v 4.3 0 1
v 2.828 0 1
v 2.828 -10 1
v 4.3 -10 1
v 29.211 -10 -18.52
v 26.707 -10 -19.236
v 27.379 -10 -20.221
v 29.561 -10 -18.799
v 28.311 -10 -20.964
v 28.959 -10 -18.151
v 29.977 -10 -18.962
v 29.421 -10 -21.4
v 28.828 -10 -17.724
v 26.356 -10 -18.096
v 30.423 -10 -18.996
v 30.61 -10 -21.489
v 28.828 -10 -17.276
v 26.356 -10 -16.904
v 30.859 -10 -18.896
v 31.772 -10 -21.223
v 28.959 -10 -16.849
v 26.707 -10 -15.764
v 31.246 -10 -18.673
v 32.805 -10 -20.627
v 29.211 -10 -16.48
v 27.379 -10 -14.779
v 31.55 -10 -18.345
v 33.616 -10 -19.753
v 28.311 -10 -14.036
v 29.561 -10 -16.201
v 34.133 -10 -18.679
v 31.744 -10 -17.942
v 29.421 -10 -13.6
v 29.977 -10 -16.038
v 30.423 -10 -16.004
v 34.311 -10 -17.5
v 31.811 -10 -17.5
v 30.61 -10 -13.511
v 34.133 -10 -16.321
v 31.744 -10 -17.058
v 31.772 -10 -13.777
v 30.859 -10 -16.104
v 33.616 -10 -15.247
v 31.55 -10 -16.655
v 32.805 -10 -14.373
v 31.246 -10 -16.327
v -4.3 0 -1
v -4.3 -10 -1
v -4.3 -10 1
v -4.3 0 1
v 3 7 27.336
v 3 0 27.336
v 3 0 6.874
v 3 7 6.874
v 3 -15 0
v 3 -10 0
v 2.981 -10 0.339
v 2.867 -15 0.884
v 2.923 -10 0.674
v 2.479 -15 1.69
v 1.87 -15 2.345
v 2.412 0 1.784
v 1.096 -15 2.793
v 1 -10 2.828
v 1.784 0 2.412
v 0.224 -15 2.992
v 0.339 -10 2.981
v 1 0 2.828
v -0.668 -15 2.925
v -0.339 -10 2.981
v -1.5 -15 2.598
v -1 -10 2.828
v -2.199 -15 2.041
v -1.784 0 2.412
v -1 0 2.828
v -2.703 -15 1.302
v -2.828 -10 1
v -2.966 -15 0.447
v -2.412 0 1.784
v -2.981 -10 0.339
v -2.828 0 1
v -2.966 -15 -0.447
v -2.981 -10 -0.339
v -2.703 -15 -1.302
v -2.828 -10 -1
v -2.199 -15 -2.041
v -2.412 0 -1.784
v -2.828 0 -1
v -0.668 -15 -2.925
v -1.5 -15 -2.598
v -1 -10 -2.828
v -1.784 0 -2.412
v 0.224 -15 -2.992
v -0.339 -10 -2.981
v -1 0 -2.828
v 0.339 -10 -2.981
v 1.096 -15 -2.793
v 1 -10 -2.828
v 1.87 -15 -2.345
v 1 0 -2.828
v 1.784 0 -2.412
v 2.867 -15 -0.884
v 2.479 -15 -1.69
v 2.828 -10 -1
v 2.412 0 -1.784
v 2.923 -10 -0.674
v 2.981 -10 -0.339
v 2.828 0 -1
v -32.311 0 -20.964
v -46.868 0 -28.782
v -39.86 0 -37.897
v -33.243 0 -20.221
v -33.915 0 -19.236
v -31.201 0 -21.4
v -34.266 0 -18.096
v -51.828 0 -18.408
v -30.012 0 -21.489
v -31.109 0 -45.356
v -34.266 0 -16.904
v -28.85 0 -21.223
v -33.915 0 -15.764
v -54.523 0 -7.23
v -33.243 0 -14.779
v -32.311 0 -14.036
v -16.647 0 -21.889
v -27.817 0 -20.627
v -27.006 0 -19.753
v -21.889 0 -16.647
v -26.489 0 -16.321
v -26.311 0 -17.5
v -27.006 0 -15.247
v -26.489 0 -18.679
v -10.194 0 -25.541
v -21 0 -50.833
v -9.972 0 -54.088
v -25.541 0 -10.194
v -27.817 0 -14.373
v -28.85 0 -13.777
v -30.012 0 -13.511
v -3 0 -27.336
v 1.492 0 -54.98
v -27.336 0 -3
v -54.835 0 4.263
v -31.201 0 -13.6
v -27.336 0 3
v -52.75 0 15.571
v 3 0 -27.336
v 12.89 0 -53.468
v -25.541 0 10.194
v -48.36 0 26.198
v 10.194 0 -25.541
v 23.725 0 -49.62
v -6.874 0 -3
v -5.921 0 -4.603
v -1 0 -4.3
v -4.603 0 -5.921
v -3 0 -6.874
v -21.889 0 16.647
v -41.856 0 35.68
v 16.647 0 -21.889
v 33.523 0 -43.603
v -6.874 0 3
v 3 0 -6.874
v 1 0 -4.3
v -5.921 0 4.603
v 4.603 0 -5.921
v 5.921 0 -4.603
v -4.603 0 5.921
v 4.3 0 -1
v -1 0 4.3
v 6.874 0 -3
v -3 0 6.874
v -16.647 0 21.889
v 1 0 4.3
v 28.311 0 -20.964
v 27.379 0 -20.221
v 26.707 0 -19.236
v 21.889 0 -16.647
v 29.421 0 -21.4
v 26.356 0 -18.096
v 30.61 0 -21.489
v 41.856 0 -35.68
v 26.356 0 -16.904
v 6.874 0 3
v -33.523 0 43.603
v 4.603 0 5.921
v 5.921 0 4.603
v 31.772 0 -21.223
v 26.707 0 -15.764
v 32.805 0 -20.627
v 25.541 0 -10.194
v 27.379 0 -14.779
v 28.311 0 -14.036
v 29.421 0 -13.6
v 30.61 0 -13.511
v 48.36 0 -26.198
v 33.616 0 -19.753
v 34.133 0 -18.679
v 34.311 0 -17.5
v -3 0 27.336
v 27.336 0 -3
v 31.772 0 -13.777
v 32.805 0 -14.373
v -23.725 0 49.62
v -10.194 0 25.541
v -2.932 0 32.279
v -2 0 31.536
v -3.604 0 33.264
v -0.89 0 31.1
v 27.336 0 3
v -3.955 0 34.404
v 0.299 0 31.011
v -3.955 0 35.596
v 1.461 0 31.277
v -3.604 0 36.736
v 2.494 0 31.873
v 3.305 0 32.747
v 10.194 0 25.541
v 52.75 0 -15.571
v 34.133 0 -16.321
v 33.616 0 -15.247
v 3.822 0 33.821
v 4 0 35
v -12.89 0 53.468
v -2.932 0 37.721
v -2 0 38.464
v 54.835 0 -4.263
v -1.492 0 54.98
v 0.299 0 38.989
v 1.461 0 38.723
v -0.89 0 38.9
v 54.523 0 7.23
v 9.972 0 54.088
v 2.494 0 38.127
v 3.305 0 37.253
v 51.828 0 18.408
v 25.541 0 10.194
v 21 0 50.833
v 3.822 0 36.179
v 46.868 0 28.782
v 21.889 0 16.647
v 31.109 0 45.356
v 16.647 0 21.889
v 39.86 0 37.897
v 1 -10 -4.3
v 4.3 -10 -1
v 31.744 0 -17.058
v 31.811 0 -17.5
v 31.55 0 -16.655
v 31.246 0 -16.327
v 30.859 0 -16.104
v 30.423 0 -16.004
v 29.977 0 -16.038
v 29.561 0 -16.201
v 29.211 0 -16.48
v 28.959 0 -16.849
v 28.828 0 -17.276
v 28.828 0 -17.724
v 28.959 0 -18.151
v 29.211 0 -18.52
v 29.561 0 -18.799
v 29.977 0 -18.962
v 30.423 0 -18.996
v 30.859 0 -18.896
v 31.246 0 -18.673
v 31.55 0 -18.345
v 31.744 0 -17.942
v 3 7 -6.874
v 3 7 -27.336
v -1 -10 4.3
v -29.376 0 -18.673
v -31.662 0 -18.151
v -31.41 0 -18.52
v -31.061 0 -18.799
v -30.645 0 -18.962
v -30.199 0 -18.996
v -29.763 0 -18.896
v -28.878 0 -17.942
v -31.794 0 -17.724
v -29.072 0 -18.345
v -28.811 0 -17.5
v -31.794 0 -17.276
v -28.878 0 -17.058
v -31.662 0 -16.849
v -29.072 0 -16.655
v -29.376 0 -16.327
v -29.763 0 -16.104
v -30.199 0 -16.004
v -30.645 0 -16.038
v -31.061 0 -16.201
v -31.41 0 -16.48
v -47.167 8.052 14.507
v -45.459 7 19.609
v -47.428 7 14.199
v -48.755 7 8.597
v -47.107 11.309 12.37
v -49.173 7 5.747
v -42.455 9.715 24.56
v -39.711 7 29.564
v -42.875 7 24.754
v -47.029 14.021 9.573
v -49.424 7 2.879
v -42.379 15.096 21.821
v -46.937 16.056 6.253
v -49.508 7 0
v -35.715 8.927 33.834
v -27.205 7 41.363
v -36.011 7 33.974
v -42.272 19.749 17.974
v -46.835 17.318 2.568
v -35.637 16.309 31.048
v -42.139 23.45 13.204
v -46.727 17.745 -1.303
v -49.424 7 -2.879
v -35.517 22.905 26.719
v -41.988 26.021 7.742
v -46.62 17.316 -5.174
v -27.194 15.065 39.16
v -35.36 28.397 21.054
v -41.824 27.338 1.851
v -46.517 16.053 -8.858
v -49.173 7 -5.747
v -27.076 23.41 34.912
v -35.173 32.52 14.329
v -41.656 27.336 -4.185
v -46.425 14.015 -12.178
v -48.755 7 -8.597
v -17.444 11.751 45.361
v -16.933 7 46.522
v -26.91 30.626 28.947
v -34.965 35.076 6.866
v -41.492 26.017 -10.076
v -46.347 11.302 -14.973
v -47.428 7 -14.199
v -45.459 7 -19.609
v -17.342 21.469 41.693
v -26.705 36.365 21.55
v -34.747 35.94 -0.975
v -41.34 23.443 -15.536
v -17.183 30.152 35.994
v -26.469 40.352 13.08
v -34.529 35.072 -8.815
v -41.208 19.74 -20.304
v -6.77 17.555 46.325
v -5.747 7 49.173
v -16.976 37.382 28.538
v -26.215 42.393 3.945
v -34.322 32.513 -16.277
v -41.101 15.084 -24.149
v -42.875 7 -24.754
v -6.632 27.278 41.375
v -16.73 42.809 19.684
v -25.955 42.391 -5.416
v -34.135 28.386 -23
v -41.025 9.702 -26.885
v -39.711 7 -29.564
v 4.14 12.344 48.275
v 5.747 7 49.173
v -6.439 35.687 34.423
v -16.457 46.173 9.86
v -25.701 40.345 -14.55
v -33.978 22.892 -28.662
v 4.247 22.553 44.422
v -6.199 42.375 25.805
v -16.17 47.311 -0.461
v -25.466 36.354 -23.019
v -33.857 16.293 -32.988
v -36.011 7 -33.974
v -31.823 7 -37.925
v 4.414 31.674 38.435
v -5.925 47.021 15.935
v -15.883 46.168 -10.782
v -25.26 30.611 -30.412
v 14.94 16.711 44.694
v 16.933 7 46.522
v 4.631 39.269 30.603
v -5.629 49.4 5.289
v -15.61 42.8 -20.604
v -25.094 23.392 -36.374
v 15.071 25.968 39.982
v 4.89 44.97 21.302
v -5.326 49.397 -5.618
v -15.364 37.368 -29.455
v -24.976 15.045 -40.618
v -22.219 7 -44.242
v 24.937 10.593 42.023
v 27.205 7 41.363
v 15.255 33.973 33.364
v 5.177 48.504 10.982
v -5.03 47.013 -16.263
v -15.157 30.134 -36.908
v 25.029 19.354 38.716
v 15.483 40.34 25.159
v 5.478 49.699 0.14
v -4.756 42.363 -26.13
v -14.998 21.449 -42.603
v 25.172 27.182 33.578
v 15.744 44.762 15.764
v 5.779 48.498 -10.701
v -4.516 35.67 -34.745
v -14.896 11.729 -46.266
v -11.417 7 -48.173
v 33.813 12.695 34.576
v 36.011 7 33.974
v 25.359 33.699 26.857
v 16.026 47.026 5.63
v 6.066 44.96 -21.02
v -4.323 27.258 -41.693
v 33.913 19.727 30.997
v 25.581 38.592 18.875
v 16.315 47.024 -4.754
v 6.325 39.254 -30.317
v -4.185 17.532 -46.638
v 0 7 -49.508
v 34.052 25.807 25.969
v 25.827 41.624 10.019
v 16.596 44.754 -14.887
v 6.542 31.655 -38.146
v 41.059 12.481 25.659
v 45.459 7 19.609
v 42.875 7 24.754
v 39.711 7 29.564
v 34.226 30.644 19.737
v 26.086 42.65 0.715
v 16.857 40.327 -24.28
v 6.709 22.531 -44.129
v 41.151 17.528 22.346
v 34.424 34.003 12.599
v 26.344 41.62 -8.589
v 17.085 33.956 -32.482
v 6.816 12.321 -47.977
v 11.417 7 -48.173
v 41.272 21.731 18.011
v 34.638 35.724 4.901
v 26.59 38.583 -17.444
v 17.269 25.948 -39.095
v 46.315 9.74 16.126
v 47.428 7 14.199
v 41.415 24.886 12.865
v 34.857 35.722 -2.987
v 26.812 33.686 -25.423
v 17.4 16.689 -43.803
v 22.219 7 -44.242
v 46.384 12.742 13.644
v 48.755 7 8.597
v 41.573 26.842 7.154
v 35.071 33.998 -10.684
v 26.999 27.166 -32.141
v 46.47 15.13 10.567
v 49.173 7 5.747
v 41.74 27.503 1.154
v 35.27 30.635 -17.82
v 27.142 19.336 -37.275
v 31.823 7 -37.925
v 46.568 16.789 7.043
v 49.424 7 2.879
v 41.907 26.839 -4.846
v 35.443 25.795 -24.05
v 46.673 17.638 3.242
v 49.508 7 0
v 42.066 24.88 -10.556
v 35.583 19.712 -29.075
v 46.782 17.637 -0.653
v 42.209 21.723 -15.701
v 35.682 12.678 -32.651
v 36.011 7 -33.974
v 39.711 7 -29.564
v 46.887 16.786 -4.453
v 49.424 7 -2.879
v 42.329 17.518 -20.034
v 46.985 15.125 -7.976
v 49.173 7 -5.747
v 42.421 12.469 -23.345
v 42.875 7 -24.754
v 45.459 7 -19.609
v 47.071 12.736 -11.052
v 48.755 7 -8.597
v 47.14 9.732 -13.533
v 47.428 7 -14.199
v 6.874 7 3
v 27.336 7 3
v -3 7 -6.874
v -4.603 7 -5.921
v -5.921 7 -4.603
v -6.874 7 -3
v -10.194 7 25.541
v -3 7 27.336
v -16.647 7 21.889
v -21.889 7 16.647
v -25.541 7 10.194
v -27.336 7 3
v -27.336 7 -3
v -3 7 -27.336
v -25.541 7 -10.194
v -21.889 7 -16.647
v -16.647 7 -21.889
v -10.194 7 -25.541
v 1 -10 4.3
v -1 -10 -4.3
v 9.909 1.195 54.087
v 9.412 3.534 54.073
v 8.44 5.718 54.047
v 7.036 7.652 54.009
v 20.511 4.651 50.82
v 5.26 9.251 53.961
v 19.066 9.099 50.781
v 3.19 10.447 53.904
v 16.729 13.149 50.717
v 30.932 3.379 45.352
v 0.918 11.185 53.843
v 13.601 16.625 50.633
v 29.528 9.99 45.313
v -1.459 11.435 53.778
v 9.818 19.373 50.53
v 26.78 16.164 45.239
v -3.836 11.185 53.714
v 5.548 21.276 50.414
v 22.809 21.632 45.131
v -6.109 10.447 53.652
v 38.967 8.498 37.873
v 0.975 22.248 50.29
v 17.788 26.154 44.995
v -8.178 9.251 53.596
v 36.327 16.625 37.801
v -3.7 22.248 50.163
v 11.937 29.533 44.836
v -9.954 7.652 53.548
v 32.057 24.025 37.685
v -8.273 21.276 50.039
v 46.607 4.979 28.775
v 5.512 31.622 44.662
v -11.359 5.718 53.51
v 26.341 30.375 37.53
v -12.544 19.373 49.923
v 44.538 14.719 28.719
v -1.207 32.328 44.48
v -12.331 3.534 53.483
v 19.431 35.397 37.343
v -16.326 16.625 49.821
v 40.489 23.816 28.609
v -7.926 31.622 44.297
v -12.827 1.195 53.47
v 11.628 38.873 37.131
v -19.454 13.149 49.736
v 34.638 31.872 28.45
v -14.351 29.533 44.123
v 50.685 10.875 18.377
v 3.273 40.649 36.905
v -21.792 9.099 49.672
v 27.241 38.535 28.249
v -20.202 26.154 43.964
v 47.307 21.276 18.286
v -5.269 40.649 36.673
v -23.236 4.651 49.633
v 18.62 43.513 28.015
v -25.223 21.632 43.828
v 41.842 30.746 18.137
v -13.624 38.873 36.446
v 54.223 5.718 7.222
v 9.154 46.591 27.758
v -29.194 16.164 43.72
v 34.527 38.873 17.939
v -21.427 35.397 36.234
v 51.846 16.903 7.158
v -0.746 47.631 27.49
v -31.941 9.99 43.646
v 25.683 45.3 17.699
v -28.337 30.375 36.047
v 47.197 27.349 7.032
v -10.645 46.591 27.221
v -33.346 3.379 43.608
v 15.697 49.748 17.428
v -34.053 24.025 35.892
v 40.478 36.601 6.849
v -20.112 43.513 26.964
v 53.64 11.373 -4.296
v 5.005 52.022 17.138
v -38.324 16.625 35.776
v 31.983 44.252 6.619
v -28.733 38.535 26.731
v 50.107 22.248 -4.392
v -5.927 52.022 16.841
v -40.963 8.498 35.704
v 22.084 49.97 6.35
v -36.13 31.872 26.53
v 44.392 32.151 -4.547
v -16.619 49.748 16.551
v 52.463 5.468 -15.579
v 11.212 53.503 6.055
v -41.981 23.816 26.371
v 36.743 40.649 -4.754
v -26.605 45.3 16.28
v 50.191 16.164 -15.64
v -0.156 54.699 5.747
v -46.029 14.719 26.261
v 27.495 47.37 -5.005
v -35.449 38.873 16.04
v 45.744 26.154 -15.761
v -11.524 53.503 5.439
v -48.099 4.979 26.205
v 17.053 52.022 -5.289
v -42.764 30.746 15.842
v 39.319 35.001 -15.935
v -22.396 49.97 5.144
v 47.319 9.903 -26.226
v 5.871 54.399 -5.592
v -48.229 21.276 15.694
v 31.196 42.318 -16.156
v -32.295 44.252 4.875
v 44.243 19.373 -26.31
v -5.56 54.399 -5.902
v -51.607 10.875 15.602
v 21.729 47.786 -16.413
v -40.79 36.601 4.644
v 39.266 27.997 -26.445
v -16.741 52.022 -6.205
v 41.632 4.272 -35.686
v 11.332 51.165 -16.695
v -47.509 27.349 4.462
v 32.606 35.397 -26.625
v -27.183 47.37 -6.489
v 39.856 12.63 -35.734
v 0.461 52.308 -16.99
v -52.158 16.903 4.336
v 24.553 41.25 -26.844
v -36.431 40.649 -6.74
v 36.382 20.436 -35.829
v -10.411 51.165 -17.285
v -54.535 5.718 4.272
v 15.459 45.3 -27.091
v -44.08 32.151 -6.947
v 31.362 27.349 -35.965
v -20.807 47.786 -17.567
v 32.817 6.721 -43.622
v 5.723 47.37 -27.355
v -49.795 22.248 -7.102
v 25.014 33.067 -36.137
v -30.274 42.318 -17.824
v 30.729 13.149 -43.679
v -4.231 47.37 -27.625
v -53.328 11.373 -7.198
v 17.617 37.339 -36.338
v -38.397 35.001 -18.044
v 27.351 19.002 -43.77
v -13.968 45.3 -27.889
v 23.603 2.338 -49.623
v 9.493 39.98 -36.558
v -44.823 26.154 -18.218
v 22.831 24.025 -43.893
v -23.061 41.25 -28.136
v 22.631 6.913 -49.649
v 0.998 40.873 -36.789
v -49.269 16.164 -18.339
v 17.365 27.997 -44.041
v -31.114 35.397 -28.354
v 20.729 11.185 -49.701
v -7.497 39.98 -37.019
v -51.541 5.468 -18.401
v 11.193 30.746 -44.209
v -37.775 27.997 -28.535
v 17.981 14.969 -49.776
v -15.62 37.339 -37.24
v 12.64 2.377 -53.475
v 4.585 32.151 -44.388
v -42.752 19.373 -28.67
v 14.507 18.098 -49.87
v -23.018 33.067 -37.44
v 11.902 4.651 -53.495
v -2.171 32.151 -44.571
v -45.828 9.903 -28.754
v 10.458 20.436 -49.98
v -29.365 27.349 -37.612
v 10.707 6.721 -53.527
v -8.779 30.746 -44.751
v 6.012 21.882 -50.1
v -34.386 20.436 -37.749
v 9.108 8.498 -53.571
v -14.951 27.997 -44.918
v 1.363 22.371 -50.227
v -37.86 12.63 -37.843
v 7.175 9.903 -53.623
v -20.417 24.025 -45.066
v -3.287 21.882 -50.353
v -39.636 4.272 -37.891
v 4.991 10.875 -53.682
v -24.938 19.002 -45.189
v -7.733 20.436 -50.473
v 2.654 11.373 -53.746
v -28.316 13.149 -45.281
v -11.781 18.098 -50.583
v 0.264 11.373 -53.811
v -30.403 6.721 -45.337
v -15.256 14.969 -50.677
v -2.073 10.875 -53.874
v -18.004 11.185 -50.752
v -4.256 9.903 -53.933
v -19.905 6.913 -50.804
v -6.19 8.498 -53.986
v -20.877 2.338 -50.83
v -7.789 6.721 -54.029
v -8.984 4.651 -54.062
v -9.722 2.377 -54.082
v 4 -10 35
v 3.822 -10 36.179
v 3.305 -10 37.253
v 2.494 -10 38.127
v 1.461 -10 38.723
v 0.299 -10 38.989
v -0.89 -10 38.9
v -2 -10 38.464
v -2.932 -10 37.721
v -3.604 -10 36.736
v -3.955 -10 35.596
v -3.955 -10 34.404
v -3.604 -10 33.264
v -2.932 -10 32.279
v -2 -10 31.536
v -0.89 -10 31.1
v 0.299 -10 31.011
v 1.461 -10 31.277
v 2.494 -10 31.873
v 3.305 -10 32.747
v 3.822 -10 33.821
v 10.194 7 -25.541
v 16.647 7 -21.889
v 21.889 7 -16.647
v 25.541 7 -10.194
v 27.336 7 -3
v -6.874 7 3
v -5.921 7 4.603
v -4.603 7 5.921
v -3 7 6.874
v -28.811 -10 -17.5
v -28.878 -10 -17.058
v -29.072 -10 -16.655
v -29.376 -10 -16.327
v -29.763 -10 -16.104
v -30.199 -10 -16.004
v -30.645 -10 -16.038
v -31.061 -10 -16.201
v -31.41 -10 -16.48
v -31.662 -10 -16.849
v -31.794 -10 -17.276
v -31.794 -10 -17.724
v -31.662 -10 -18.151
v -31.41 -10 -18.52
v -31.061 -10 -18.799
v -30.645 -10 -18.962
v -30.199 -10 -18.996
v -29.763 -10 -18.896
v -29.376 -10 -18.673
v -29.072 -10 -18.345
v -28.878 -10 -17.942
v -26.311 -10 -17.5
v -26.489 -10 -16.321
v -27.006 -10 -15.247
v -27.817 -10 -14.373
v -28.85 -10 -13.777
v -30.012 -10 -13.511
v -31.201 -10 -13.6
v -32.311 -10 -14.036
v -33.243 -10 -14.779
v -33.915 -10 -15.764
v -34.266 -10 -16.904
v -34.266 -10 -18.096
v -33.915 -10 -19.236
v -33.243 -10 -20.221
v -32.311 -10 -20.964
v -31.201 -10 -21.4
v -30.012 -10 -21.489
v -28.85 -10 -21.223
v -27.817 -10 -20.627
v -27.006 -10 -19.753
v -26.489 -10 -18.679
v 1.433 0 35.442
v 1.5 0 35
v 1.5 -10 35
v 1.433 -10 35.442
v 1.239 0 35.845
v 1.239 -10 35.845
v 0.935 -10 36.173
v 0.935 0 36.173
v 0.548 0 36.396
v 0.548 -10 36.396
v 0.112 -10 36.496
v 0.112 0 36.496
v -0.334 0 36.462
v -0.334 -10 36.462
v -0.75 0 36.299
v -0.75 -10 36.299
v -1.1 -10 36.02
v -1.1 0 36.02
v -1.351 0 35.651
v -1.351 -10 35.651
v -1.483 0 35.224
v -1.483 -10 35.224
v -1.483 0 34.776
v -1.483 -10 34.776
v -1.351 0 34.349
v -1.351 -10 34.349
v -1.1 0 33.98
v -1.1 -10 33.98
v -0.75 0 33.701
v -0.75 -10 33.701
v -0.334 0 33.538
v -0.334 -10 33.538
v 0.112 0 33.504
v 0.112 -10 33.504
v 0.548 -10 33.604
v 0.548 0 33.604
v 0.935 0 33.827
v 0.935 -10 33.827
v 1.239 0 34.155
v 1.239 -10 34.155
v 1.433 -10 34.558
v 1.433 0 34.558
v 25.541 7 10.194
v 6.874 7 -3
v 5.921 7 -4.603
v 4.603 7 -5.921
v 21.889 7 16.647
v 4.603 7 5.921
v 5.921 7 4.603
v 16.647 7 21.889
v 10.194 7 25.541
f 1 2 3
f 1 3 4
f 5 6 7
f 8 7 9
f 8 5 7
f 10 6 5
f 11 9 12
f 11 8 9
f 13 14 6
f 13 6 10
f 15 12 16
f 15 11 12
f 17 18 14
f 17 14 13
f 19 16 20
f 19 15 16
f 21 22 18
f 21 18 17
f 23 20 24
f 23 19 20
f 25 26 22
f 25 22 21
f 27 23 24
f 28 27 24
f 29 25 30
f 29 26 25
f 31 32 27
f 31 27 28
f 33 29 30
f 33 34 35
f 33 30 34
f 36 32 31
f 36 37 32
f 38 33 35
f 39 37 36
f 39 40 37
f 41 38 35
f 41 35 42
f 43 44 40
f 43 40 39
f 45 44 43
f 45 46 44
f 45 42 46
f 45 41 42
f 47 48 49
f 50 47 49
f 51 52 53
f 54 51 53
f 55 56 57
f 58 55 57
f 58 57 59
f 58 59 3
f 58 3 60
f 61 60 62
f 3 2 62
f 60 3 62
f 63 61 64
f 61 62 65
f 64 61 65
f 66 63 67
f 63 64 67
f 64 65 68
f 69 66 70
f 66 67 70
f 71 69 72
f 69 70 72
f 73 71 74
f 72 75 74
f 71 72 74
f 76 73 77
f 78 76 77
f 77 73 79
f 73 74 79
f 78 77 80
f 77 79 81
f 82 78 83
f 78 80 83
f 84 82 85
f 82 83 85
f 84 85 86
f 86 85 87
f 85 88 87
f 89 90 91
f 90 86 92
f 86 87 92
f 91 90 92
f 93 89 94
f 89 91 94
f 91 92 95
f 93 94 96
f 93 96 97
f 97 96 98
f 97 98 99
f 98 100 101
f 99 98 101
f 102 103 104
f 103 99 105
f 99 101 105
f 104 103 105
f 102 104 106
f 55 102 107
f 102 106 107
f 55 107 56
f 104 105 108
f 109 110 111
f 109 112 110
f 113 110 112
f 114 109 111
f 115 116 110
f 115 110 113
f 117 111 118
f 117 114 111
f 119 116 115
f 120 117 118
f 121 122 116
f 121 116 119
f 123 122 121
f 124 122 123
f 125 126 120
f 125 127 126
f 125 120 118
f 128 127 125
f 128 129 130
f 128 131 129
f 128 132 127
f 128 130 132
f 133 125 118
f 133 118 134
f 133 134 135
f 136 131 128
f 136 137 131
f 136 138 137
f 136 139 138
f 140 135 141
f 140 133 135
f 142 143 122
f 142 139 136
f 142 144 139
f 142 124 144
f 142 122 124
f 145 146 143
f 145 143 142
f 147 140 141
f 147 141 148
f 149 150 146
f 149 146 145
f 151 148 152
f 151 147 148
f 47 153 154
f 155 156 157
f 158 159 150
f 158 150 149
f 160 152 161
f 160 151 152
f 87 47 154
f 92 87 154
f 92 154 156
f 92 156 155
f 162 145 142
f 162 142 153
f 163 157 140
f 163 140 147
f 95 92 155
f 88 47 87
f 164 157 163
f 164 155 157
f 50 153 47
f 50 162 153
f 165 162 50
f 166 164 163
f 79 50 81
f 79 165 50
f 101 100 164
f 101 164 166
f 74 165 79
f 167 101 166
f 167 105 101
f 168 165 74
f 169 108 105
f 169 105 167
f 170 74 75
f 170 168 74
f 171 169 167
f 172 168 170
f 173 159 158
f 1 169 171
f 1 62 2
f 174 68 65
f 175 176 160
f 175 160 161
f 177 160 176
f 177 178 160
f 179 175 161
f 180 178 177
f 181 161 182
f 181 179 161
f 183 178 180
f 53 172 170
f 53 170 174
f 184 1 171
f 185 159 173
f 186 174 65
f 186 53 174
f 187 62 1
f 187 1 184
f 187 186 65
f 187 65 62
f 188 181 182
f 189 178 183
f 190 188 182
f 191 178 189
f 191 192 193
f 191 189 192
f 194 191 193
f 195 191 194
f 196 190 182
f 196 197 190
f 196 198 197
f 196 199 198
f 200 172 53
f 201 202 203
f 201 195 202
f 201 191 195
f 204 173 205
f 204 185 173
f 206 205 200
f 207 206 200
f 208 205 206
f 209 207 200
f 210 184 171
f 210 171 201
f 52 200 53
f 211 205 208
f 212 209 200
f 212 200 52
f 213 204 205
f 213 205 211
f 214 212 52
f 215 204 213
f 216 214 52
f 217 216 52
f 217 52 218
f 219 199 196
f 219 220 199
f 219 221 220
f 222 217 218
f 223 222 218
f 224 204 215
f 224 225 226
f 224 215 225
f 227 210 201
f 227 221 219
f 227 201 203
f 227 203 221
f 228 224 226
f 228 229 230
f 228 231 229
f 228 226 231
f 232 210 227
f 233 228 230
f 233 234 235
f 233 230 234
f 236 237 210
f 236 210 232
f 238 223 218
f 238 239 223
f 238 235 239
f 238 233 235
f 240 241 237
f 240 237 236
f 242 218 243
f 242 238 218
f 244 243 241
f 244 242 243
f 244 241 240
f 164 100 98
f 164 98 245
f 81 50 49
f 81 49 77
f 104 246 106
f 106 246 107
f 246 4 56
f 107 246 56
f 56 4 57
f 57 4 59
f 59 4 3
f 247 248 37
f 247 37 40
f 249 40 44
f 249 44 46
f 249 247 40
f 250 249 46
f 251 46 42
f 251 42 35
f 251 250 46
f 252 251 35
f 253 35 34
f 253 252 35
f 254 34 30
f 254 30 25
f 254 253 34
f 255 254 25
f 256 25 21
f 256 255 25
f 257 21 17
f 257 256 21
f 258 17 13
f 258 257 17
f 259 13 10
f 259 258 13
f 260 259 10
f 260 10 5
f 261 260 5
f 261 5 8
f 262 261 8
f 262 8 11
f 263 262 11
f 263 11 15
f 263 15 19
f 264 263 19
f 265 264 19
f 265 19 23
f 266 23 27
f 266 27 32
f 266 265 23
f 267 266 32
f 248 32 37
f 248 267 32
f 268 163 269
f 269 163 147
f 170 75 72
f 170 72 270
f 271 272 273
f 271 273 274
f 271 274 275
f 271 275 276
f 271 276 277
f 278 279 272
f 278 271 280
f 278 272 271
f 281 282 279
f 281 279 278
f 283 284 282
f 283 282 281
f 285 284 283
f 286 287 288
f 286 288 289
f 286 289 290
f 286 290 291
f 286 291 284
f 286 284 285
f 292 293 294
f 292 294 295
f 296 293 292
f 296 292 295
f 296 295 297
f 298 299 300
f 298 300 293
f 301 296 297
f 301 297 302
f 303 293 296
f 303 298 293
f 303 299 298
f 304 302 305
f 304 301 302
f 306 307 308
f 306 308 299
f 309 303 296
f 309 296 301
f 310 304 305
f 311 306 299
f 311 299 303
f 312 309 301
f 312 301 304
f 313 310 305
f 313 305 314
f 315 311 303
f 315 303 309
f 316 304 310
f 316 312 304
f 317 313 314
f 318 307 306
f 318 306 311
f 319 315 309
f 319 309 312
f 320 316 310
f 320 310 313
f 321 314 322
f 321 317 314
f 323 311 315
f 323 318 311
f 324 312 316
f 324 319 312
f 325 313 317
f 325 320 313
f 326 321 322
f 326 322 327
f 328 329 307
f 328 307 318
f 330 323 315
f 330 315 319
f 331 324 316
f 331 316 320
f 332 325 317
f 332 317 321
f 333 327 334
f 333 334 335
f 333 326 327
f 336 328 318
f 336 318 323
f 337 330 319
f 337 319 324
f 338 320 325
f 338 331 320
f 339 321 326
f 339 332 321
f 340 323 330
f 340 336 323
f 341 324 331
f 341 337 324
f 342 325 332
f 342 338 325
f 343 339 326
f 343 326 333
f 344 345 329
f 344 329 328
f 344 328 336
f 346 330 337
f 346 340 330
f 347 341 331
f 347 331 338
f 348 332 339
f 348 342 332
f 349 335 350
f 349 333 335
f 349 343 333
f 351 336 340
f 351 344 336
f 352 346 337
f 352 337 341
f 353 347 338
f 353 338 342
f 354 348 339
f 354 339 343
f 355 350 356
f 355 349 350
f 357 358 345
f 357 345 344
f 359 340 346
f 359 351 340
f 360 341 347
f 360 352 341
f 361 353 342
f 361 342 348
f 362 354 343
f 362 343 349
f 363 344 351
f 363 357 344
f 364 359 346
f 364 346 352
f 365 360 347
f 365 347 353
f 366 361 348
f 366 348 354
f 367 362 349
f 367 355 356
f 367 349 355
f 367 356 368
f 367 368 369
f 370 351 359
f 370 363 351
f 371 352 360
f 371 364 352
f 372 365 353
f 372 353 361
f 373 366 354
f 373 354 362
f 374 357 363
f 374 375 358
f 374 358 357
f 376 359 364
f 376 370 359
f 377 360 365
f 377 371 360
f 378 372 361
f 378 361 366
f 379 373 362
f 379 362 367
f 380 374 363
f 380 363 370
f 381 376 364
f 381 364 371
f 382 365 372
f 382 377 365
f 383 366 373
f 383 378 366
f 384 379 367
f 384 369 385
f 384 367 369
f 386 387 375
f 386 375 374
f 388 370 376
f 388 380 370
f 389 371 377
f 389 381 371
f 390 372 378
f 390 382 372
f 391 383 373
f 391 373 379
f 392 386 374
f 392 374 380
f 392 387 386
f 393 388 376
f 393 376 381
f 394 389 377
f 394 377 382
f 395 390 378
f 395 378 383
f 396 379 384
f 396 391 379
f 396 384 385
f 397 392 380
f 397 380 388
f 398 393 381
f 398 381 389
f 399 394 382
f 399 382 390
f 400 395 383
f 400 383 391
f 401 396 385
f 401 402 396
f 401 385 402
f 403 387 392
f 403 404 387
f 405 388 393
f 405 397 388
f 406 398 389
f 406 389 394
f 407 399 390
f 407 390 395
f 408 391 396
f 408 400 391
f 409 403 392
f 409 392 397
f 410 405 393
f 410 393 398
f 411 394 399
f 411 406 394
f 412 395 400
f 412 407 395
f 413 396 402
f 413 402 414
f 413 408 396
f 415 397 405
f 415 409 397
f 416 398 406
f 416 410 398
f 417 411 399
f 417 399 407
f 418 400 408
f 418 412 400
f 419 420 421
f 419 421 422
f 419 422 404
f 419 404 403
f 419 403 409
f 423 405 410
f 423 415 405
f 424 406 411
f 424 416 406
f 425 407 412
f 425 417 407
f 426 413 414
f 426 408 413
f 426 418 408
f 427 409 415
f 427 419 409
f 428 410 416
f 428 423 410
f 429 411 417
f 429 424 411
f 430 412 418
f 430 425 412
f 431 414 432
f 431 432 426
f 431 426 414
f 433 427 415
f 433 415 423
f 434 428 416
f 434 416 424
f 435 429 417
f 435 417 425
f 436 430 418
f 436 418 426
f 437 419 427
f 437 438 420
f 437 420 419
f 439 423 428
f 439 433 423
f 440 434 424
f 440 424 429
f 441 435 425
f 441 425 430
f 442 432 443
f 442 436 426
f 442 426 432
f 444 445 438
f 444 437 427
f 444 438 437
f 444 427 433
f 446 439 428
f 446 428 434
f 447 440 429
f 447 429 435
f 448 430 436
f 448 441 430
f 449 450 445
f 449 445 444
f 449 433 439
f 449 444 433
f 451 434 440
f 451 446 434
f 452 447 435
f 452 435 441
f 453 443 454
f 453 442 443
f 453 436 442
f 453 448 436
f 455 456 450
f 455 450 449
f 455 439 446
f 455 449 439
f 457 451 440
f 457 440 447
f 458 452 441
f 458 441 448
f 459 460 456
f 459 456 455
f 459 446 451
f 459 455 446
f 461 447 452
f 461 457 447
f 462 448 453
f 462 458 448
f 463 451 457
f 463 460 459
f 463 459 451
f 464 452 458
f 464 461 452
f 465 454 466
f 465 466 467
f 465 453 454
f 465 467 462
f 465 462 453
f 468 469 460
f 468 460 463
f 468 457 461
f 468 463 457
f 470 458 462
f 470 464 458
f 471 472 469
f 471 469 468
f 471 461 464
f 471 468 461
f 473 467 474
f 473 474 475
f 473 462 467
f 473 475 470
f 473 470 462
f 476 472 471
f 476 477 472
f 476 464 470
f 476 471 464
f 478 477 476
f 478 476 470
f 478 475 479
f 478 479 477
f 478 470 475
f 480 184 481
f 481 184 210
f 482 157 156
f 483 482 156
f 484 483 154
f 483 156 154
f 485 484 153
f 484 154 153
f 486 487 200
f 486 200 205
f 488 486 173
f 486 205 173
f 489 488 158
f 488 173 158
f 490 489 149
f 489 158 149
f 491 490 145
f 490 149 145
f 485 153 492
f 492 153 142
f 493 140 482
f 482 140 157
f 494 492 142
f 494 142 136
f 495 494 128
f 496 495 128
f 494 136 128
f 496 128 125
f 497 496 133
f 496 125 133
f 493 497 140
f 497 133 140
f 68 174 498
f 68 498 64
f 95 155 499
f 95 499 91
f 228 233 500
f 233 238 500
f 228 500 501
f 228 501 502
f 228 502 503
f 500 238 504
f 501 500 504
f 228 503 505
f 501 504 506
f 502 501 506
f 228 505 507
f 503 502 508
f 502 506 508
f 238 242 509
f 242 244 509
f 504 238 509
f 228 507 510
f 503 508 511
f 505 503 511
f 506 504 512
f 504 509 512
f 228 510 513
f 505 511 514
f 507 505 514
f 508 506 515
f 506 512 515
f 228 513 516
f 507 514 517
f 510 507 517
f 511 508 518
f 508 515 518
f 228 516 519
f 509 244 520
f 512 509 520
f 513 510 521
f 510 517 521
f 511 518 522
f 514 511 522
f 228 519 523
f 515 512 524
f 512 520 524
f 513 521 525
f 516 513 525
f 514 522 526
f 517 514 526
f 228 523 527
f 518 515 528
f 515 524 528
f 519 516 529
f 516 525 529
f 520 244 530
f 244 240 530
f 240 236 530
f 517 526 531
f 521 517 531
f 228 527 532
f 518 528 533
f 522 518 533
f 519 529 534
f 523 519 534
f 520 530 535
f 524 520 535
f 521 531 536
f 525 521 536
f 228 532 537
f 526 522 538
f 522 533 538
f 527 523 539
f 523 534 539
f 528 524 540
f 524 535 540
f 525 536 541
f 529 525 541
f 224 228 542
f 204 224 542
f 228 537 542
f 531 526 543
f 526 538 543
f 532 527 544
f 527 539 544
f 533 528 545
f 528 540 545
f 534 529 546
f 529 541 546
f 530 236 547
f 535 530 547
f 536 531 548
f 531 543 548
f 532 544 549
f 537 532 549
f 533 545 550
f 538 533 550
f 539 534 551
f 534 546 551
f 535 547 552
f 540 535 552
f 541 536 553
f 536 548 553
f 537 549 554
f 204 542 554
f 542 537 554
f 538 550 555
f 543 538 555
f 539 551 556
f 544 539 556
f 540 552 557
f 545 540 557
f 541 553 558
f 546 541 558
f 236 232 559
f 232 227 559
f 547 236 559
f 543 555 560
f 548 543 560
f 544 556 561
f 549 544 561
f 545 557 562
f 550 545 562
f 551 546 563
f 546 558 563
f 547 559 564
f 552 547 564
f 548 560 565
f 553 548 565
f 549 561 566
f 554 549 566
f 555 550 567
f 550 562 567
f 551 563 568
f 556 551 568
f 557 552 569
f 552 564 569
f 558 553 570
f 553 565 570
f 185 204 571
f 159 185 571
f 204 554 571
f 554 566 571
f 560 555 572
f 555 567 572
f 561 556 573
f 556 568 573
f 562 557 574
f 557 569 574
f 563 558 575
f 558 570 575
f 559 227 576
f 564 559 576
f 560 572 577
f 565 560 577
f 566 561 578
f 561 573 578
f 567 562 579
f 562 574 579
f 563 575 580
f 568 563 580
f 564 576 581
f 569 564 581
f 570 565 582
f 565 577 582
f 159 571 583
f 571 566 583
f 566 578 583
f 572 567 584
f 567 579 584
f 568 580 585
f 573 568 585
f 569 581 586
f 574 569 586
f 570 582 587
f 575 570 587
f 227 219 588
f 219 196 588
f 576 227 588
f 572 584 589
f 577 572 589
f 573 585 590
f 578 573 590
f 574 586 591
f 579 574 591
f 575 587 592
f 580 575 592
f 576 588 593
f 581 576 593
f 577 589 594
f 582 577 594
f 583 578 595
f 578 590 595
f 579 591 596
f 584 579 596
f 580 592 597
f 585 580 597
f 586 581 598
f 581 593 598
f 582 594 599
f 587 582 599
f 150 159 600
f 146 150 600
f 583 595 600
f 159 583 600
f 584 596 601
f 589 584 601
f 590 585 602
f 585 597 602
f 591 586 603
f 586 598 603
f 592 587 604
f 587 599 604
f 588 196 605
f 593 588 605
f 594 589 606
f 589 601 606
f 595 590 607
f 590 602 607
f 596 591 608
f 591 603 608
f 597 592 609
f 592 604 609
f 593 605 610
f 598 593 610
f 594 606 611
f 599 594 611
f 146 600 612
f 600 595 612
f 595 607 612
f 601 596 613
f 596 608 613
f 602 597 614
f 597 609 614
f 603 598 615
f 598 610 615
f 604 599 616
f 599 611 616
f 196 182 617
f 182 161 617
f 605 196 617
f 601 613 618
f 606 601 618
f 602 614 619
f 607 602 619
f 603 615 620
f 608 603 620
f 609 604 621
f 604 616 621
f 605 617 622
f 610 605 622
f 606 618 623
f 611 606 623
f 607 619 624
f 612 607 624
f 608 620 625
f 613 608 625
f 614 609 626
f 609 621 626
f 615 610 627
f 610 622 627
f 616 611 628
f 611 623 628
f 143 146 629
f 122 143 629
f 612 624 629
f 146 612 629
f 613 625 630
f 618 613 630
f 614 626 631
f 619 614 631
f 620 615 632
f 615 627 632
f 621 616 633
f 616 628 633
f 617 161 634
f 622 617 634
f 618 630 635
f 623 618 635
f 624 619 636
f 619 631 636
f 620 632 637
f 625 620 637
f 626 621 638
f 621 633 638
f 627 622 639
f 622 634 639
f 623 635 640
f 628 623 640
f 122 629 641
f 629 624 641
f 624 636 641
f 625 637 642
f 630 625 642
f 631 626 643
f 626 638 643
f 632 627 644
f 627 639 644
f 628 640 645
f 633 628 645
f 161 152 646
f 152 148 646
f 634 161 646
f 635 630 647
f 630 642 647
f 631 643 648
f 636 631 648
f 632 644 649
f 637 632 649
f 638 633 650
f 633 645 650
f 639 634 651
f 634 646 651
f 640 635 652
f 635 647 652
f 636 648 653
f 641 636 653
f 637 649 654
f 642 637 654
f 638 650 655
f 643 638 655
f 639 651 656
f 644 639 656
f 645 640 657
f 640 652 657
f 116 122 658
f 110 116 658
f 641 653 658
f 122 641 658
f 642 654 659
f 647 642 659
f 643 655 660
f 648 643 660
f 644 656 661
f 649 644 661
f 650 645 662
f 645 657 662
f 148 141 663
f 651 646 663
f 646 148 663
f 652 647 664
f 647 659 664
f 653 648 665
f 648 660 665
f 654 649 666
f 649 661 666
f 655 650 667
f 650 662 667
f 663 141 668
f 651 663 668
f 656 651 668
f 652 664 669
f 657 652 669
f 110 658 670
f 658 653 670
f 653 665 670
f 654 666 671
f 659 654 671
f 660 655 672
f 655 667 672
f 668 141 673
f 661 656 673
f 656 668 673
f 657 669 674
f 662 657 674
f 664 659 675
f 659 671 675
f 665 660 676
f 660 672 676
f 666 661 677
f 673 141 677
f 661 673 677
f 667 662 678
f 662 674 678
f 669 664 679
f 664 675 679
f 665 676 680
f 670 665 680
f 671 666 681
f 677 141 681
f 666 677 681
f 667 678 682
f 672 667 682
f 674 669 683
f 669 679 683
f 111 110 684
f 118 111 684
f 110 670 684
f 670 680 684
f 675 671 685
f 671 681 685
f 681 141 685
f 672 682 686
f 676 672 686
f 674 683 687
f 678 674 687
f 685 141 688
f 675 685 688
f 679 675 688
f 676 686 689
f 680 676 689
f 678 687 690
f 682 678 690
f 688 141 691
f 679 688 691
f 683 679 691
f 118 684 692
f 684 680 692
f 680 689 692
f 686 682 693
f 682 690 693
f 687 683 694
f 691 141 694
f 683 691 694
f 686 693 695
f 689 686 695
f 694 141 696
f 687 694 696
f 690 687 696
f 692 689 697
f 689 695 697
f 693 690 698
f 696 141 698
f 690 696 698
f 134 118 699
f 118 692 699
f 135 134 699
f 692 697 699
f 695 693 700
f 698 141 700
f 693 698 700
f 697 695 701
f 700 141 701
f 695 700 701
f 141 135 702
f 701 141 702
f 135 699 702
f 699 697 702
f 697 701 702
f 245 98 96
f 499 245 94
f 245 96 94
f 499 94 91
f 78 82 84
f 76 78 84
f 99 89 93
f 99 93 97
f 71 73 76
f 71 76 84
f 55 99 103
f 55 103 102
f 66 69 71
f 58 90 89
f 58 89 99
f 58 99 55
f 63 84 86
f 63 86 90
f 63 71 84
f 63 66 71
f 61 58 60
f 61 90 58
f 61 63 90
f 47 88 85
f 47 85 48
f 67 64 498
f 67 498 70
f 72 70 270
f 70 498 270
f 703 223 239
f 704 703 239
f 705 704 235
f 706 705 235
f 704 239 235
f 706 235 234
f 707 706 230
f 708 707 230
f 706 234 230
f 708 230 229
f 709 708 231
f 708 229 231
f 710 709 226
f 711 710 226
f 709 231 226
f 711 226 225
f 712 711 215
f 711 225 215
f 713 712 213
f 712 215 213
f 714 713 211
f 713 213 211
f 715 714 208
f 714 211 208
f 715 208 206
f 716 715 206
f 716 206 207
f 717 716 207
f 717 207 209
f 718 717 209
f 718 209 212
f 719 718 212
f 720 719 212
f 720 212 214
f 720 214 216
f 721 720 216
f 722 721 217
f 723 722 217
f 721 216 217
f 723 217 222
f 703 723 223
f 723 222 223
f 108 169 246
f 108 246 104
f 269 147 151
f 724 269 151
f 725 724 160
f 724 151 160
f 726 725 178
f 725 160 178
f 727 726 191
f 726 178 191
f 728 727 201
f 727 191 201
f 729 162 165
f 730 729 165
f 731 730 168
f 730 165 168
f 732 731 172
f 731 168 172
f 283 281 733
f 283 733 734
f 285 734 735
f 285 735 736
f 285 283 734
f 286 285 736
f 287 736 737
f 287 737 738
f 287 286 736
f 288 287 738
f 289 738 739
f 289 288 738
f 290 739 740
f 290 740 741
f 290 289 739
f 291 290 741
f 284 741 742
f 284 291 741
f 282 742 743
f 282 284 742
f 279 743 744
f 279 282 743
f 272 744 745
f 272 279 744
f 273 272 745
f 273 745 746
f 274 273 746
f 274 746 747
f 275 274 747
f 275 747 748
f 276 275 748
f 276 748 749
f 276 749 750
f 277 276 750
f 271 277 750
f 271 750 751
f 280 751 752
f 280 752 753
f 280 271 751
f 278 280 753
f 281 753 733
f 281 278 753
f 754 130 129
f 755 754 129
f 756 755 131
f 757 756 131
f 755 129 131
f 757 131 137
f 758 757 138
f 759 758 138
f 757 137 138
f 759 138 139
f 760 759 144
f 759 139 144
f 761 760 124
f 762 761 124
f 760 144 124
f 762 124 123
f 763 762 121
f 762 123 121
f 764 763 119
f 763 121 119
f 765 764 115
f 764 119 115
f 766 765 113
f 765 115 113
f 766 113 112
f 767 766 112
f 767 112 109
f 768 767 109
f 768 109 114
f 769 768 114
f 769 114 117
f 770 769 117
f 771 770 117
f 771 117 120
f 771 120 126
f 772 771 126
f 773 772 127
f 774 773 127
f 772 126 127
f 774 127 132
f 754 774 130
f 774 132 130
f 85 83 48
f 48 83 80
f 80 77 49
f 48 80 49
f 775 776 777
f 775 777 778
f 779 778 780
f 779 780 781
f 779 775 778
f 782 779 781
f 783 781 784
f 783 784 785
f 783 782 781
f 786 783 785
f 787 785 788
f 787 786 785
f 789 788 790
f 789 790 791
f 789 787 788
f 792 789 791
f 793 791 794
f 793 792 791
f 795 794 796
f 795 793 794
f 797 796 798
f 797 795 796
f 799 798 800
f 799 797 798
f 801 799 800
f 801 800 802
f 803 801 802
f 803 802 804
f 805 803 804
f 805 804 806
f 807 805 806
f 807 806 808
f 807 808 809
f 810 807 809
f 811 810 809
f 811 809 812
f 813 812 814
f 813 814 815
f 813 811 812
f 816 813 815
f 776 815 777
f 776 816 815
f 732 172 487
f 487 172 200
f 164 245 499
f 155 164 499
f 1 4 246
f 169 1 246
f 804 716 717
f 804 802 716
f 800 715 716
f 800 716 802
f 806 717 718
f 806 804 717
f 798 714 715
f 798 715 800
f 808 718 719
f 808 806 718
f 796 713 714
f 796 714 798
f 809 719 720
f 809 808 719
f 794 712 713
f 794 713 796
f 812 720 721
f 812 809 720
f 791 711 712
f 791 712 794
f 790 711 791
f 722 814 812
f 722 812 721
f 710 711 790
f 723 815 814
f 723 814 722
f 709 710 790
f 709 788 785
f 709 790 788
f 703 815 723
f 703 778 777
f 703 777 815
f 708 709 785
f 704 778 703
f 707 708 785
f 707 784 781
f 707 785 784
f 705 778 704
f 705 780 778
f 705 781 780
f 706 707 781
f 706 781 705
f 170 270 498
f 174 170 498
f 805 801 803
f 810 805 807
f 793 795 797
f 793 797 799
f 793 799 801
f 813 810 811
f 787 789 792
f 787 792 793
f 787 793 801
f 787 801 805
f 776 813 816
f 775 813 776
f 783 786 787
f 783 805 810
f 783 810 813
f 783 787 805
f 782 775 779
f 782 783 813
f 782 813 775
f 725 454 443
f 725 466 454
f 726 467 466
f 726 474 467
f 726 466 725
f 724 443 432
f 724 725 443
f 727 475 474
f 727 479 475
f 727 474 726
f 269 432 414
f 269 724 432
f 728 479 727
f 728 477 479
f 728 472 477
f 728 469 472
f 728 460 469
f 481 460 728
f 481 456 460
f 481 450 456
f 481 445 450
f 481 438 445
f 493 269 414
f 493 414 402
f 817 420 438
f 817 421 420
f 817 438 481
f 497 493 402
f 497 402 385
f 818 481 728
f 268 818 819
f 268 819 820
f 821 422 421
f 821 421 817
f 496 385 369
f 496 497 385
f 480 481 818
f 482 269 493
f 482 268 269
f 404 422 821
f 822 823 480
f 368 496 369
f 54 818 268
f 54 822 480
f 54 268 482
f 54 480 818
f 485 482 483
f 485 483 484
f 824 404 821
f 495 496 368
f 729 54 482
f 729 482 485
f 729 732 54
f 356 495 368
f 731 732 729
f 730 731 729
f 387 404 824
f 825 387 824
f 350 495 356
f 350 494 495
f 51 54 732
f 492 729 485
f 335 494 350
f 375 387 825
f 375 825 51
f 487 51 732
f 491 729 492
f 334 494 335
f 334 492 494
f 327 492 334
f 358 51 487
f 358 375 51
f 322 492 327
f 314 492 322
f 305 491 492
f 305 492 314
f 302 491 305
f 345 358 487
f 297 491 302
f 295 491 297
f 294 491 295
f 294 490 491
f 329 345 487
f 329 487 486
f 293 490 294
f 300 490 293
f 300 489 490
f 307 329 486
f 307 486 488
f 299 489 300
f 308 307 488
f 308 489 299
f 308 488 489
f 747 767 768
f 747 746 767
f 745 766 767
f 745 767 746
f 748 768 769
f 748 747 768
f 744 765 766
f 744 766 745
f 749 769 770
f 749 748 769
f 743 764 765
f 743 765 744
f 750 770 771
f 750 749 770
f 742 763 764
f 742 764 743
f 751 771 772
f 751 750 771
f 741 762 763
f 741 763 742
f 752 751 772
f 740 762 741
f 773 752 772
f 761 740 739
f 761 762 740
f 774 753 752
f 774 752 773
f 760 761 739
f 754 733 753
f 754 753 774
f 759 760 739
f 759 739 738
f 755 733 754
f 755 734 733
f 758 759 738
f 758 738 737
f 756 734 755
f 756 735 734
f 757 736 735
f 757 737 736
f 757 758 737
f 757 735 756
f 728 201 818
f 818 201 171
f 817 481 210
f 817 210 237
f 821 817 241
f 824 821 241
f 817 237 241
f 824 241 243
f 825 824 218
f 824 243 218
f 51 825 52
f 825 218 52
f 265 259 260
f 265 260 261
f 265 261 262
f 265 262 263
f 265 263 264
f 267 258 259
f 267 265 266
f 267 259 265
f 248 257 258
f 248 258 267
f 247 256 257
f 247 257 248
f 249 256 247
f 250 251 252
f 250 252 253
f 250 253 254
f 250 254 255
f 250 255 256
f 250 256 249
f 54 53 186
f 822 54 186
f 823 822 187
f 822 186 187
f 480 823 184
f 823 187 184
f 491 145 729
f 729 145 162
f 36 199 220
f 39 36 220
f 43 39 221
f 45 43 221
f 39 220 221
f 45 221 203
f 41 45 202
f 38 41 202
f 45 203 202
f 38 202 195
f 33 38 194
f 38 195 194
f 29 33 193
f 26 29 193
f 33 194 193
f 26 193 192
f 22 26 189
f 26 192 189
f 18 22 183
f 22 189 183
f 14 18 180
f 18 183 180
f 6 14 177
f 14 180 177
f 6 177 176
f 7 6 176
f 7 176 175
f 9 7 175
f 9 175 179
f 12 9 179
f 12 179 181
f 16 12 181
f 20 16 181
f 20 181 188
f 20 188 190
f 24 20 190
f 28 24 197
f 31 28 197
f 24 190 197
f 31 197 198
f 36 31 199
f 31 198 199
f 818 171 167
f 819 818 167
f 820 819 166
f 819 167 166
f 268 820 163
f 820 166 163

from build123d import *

# Parameters (mm, degrees)
REVOLVE1_ANGLE      = 180
SKETCH4_R           = 50
BOSS_EXTRUDE1_DEPTH = 7
SKETCH5_R           = 4
SKETCH5_R_2         = 1.5
BOSS_EXTRUDE2_DEPTH = 10
SKETCH6_R           = 27.5
CUT_EXTRUDE1_DEPTH  = 10
BOSS_EXTRUDE3_DEPTH = 7
SKETCH8_R           = 3
BOSS_EXTRUDE4_DEPTH = 15
BOSS_EXTRUDE5_DEPTH = 10


with BuildPart() as part:
    # Sketch1 → Revolve1 (revolve)
    with BuildSketch(Plane(origin=(0, 0, 0), x_dir=(1, 0, 0), z_dir=(0, 1, 0))):
        with BuildLine():
            Line((1.491717845, 54.979766986), (-1.491717845, -54.979766986))
            ThreePointArc((-1.491717845, -54.979766986), (54.979766986, -1.491717845), (1.491717845, 54.979766986))
        make_face()
    revolve(axis=Axis((1.491717845, 0, -54.979766986), (-0.027122143, 0, 0.999632127)), revolution_arc=REVOLVE1_ANGLE)

    # Sketch2 → Cut-Revolve1 (revolve, cut)
    with BuildSketch(Plane.XZ):
        with BuildLine():
            Line((49.980692072, 1.389395568), (-49.980692072, -1.389395568))
            ThreePointArc((-49.980692072, -1.389395568), (-1.389395568, 49.980692072), (49.980692072, 1.389395568))
        make_face()
    revolve(axis=Axis((49.980692072, 0, 1.389395568), (-0.999613841, 0, -0.027787911)), mode=Mode.SUBTRACT)

    # Sketch4 → Boss-Extrude1 (add)
    with BuildSketch(Plane.XZ):
        Circle(SKETCH4_R)
    extrude(amount=-BOSS_EXTRUDE1_DEPTH)

    # Sketch5 → Boss-Extrude2 (add)
    with BuildSketch(Plane.XZ):
        with Locations((0, 35)):
            Circle(SKETCH5_R)
        with Locations((0, 35)):
            Circle(SKETCH5_R_2, mode=Mode.SUBTRACT)
        with Locations((30.310889132, -17.5)):
            Circle(SKETCH5_R)
        with Locations((30.310889132, -17.5)):
            Circle(SKETCH5_R_2, mode=Mode.SUBTRACT)
        with Locations((-30.310889132, -17.5)):
            Circle(SKETCH5_R)
        with Locations((-30.310889132, -17.5)):
            Circle(SKETCH5_R_2, mode=Mode.SUBTRACT)
    extrude(amount=BOSS_EXTRUDE2_DEPTH)

    # Sketch6 → Cut-Extrude1 (cut)
    with BuildSketch(Plane.XZ):
        Circle(SKETCH6_R)
    extrude(amount=-CUT_EXTRUDE1_DEPTH, mode=Mode.SUBTRACT)

    # Sketch7 → Boss-Extrude3 (add)
    with BuildSketch(Plane.XZ):
        with BuildLine():
            Line((-29.59626463, 3), (-6.873863542, 3))
            ThreePointArc((-6.873863542, 3), (-5.303300859, 5.303300859), (-3, 6.873863542))
            Line((-3, 6.873863542), (-3, 29.076054117))
            Line((-3, 29.076054117), (3, 29.076054117))
            Line((3, 29.076054117), (3, 6.873863542))
            ThreePointArc((3, 6.873863542), (5.303300859, 5.303300859), (6.873863542, 3))
            Line((6.873863542, 3), (29.260564873, 3))
            Line((29.260564873, 3), (29.260564873, -3))
            Line((29.260564873, -3), (6.873863542, -3))
            ThreePointArc((6.873863542, -3), (5.303300859, -5.303300859), (3, -6.873863542))
            Line((3, -6.873863542), (3, -30.682999102))
            Line((3, -30.682999102), (-3, -30.682999102))
            Line((-3, -30.682999102), (-3, -6.873863542))
            ThreePointArc((-3, -6.873863542), (-5.303300859, -5.303300859), (-6.873863542, -3))
            Line((-6.873863542, -3), (-29.59626463, -3))
            Line((-29.59626463, -3), (-29.59626463, 3))
        make_face()
    extrude(amount=-BOSS_EXTRUDE3_DEPTH)

    # Sketch8 → Boss-Extrude4 (add)
    with BuildSketch(Plane.XZ):
        Circle(SKETCH8_R)
    extrude(amount=BOSS_EXTRUDE4_DEPTH)

    # Sketch9 → Boss-Extrude5 (add)
    with BuildSketch(Plane.XZ):
        Polygon((1, 1), (4.3, 1), (4.3, -1), (1, -1), (1, -4.3), (-1, -4.3), (-1, -1), (-4.3, -1), (-4.3, 1), (-1, 1), (-1, 4.3), (1, 4.3), align=None)
    extrude(amount=BOSS_EXTRUDE5_DEPTH)


solid = part.part
